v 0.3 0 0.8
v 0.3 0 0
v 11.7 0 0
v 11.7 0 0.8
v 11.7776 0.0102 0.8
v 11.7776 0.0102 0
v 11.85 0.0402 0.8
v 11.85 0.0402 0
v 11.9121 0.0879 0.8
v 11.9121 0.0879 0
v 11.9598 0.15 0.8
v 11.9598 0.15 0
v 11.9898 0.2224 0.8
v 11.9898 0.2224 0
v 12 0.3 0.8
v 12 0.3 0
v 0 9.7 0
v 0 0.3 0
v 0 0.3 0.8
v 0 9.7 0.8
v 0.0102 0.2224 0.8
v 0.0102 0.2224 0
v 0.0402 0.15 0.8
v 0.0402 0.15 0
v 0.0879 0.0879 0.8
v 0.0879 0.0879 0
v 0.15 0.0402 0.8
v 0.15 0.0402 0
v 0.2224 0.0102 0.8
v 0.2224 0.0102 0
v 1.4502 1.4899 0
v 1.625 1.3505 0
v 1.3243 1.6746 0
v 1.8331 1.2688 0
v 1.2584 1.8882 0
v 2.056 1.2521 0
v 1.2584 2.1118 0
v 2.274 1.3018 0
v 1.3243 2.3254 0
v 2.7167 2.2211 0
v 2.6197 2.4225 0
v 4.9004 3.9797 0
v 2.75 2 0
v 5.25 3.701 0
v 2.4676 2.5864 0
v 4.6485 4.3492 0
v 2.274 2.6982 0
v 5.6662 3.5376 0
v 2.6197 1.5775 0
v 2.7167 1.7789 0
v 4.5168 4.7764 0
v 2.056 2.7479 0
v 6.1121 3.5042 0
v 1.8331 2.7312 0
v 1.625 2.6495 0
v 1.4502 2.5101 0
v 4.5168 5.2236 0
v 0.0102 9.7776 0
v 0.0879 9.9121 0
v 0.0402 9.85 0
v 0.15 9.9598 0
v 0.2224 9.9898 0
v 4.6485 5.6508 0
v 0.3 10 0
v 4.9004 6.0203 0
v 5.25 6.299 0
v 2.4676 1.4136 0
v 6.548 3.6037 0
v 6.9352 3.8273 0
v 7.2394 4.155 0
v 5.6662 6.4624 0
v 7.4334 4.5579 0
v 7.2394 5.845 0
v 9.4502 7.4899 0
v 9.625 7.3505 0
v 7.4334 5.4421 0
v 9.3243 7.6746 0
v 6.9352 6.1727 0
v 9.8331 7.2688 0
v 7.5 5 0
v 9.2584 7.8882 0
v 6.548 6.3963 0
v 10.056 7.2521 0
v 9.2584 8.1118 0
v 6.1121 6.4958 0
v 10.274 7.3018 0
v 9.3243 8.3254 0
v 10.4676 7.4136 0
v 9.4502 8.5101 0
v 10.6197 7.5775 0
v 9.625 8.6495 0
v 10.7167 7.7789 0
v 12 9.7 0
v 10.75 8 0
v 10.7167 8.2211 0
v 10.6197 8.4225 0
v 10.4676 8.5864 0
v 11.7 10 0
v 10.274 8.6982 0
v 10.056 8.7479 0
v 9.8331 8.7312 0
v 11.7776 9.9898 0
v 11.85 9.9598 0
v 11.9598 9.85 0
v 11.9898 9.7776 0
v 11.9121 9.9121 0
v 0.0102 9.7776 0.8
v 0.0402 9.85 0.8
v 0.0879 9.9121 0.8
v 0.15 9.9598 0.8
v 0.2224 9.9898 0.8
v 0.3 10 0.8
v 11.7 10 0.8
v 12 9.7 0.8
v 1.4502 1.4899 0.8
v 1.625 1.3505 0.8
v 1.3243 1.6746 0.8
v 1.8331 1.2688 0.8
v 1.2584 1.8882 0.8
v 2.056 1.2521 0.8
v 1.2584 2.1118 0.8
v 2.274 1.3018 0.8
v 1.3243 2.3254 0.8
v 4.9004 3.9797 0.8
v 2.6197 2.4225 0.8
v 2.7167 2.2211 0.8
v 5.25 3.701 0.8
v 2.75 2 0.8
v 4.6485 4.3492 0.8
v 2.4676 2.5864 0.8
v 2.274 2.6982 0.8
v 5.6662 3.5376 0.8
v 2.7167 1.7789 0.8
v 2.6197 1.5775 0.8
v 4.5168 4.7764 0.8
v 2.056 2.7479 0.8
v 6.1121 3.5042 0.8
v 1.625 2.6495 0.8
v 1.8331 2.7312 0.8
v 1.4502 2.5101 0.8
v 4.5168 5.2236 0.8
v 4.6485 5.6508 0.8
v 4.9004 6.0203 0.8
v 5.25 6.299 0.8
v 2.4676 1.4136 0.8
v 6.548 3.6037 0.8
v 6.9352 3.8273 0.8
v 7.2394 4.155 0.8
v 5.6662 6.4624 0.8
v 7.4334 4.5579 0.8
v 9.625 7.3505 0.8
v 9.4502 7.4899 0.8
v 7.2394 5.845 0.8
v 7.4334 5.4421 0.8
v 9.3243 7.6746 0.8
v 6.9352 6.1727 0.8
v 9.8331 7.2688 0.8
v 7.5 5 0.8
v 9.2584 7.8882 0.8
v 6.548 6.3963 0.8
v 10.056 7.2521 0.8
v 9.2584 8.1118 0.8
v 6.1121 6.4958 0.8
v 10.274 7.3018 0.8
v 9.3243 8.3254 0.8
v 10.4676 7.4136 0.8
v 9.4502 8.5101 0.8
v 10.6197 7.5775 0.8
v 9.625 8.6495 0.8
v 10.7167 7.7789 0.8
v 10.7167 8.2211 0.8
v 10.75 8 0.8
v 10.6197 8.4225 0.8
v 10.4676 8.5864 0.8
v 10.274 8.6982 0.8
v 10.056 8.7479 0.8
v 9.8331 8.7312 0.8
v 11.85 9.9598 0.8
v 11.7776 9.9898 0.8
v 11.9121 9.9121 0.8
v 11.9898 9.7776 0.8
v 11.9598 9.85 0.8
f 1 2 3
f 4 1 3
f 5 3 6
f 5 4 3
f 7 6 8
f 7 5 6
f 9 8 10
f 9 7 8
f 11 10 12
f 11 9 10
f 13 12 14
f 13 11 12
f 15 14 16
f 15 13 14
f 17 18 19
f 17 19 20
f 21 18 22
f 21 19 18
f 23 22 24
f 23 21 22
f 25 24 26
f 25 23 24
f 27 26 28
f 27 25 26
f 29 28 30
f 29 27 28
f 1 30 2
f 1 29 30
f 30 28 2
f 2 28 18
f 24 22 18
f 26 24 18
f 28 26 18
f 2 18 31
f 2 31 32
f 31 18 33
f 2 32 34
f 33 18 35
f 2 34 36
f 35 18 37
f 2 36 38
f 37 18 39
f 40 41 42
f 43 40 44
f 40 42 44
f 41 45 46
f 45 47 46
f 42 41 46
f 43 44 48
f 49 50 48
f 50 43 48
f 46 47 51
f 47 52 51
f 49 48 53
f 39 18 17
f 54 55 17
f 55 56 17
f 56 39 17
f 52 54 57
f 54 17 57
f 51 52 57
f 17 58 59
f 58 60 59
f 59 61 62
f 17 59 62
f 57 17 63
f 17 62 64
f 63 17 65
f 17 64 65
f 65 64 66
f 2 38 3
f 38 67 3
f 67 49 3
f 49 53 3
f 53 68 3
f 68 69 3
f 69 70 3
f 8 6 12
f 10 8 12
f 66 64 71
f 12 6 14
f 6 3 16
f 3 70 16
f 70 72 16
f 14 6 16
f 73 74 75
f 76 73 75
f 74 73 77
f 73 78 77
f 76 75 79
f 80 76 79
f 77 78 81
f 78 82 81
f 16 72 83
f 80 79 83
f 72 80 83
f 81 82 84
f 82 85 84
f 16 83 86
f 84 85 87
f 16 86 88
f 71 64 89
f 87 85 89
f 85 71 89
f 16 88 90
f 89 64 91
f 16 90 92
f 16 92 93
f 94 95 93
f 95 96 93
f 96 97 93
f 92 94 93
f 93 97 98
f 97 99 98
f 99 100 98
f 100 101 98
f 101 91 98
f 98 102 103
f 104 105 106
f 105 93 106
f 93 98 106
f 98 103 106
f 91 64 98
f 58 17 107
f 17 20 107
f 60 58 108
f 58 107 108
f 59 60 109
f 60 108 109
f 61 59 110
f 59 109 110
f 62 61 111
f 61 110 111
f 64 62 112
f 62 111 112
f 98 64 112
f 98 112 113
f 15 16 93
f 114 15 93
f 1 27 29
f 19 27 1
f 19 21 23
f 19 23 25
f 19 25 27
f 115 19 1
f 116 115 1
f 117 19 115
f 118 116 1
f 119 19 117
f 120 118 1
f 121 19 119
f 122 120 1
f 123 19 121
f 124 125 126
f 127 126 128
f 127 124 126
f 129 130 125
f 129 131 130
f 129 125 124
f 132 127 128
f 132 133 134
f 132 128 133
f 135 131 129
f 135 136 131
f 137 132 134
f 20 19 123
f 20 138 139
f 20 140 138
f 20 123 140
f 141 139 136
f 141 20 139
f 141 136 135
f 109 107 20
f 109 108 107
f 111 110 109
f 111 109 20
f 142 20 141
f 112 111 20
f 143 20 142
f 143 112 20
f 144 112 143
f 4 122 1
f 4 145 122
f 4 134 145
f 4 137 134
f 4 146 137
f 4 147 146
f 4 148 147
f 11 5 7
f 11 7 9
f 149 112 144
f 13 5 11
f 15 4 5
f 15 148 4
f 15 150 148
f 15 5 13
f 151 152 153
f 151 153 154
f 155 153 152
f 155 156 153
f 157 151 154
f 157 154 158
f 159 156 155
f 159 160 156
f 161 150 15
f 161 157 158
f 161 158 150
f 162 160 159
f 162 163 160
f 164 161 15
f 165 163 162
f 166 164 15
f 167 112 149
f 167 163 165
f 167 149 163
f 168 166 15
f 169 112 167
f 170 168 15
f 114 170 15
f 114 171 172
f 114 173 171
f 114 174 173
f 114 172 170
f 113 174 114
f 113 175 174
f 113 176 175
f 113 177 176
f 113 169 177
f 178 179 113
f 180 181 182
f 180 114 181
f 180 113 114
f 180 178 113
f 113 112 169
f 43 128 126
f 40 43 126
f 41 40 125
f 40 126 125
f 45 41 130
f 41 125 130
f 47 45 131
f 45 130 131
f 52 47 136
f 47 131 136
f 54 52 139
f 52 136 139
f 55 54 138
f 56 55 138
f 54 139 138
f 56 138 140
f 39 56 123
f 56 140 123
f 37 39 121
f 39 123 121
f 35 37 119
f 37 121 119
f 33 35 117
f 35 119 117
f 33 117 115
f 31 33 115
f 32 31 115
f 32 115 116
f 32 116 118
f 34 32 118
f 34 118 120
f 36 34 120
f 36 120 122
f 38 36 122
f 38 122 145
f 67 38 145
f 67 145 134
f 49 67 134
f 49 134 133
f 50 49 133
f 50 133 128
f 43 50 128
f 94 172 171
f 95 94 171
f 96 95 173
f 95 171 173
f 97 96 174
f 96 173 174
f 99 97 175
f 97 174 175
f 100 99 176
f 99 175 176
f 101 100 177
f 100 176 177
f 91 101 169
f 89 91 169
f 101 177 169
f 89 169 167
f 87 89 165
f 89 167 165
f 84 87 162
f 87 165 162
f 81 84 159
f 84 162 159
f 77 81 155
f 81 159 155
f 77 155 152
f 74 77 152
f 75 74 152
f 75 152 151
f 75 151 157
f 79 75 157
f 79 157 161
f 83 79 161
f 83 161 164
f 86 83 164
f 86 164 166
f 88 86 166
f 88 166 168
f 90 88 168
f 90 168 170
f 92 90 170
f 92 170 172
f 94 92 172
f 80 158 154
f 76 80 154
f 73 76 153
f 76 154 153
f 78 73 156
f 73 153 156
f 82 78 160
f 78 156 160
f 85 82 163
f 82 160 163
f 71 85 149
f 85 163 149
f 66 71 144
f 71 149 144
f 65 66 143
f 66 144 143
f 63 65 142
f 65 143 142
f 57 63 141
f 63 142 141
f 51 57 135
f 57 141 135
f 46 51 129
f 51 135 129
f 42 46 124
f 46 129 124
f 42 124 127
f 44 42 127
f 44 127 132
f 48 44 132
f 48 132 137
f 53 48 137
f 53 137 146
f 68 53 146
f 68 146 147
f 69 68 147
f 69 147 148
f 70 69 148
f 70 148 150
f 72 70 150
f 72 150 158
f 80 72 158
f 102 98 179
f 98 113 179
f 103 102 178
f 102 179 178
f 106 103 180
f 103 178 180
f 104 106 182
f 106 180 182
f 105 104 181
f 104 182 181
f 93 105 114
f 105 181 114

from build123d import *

# Parameters (mm, degrees)
SKIZZE1_W                       = 12
SKIZZE1_H                       = 10
AUFSATZ_LINEAR_AUSTRAGEN1_DEPTH = 0.8
SKIZZE2_R                       = 0.75
SKIZZE2_R_2                     = 1.5
SCHNITT_LINEAR_AUSTRAGEN1_DEPTH = 16.640971837
VERRUNDUNG1_R                   = 0.3


with BuildPart() as part:
    # Skizze1 → Aufsatz-Linear austragen1 (new body)
    with BuildSketch(Plane.XY):
        with Locations((6, 5)):
            Rectangle(SKIZZE1_W, SKIZZE1_H)
    extrude(amount=AUFSATZ_LINEAR_AUSTRAGEN1_DEPTH)

    # Skizze2 → Schnitt-Linear austragen1 (cut, through all)
    with BuildSketch(Plane.XY.offset(0.8)):
        with Locations((2, 2)):
            Circle(SKIZZE2_R)
        with Locations((6, 5)):
            Circle(SKIZZE2_R_2)
        with Locations((10, 8)):
            Circle(SKIZZE2_R)
    extrude(amount=-SCHNITT_LINEAR_AUSTRAGEN1_DEPTH, mode=Mode.SUBTRACT)

    # Verrundung1
    verrundung1_edges = [part.edges().sort_by_distance(p)[0] for p in [
        (0, 10, 0.4),
        (12, 10, 0.4),
        (12, 0, 0.4),
        (0, 0, 0.4),
    ]]
    fillet(verrundung1_edges, radius=VERRUNDUNG1_R)


solid = part.part
